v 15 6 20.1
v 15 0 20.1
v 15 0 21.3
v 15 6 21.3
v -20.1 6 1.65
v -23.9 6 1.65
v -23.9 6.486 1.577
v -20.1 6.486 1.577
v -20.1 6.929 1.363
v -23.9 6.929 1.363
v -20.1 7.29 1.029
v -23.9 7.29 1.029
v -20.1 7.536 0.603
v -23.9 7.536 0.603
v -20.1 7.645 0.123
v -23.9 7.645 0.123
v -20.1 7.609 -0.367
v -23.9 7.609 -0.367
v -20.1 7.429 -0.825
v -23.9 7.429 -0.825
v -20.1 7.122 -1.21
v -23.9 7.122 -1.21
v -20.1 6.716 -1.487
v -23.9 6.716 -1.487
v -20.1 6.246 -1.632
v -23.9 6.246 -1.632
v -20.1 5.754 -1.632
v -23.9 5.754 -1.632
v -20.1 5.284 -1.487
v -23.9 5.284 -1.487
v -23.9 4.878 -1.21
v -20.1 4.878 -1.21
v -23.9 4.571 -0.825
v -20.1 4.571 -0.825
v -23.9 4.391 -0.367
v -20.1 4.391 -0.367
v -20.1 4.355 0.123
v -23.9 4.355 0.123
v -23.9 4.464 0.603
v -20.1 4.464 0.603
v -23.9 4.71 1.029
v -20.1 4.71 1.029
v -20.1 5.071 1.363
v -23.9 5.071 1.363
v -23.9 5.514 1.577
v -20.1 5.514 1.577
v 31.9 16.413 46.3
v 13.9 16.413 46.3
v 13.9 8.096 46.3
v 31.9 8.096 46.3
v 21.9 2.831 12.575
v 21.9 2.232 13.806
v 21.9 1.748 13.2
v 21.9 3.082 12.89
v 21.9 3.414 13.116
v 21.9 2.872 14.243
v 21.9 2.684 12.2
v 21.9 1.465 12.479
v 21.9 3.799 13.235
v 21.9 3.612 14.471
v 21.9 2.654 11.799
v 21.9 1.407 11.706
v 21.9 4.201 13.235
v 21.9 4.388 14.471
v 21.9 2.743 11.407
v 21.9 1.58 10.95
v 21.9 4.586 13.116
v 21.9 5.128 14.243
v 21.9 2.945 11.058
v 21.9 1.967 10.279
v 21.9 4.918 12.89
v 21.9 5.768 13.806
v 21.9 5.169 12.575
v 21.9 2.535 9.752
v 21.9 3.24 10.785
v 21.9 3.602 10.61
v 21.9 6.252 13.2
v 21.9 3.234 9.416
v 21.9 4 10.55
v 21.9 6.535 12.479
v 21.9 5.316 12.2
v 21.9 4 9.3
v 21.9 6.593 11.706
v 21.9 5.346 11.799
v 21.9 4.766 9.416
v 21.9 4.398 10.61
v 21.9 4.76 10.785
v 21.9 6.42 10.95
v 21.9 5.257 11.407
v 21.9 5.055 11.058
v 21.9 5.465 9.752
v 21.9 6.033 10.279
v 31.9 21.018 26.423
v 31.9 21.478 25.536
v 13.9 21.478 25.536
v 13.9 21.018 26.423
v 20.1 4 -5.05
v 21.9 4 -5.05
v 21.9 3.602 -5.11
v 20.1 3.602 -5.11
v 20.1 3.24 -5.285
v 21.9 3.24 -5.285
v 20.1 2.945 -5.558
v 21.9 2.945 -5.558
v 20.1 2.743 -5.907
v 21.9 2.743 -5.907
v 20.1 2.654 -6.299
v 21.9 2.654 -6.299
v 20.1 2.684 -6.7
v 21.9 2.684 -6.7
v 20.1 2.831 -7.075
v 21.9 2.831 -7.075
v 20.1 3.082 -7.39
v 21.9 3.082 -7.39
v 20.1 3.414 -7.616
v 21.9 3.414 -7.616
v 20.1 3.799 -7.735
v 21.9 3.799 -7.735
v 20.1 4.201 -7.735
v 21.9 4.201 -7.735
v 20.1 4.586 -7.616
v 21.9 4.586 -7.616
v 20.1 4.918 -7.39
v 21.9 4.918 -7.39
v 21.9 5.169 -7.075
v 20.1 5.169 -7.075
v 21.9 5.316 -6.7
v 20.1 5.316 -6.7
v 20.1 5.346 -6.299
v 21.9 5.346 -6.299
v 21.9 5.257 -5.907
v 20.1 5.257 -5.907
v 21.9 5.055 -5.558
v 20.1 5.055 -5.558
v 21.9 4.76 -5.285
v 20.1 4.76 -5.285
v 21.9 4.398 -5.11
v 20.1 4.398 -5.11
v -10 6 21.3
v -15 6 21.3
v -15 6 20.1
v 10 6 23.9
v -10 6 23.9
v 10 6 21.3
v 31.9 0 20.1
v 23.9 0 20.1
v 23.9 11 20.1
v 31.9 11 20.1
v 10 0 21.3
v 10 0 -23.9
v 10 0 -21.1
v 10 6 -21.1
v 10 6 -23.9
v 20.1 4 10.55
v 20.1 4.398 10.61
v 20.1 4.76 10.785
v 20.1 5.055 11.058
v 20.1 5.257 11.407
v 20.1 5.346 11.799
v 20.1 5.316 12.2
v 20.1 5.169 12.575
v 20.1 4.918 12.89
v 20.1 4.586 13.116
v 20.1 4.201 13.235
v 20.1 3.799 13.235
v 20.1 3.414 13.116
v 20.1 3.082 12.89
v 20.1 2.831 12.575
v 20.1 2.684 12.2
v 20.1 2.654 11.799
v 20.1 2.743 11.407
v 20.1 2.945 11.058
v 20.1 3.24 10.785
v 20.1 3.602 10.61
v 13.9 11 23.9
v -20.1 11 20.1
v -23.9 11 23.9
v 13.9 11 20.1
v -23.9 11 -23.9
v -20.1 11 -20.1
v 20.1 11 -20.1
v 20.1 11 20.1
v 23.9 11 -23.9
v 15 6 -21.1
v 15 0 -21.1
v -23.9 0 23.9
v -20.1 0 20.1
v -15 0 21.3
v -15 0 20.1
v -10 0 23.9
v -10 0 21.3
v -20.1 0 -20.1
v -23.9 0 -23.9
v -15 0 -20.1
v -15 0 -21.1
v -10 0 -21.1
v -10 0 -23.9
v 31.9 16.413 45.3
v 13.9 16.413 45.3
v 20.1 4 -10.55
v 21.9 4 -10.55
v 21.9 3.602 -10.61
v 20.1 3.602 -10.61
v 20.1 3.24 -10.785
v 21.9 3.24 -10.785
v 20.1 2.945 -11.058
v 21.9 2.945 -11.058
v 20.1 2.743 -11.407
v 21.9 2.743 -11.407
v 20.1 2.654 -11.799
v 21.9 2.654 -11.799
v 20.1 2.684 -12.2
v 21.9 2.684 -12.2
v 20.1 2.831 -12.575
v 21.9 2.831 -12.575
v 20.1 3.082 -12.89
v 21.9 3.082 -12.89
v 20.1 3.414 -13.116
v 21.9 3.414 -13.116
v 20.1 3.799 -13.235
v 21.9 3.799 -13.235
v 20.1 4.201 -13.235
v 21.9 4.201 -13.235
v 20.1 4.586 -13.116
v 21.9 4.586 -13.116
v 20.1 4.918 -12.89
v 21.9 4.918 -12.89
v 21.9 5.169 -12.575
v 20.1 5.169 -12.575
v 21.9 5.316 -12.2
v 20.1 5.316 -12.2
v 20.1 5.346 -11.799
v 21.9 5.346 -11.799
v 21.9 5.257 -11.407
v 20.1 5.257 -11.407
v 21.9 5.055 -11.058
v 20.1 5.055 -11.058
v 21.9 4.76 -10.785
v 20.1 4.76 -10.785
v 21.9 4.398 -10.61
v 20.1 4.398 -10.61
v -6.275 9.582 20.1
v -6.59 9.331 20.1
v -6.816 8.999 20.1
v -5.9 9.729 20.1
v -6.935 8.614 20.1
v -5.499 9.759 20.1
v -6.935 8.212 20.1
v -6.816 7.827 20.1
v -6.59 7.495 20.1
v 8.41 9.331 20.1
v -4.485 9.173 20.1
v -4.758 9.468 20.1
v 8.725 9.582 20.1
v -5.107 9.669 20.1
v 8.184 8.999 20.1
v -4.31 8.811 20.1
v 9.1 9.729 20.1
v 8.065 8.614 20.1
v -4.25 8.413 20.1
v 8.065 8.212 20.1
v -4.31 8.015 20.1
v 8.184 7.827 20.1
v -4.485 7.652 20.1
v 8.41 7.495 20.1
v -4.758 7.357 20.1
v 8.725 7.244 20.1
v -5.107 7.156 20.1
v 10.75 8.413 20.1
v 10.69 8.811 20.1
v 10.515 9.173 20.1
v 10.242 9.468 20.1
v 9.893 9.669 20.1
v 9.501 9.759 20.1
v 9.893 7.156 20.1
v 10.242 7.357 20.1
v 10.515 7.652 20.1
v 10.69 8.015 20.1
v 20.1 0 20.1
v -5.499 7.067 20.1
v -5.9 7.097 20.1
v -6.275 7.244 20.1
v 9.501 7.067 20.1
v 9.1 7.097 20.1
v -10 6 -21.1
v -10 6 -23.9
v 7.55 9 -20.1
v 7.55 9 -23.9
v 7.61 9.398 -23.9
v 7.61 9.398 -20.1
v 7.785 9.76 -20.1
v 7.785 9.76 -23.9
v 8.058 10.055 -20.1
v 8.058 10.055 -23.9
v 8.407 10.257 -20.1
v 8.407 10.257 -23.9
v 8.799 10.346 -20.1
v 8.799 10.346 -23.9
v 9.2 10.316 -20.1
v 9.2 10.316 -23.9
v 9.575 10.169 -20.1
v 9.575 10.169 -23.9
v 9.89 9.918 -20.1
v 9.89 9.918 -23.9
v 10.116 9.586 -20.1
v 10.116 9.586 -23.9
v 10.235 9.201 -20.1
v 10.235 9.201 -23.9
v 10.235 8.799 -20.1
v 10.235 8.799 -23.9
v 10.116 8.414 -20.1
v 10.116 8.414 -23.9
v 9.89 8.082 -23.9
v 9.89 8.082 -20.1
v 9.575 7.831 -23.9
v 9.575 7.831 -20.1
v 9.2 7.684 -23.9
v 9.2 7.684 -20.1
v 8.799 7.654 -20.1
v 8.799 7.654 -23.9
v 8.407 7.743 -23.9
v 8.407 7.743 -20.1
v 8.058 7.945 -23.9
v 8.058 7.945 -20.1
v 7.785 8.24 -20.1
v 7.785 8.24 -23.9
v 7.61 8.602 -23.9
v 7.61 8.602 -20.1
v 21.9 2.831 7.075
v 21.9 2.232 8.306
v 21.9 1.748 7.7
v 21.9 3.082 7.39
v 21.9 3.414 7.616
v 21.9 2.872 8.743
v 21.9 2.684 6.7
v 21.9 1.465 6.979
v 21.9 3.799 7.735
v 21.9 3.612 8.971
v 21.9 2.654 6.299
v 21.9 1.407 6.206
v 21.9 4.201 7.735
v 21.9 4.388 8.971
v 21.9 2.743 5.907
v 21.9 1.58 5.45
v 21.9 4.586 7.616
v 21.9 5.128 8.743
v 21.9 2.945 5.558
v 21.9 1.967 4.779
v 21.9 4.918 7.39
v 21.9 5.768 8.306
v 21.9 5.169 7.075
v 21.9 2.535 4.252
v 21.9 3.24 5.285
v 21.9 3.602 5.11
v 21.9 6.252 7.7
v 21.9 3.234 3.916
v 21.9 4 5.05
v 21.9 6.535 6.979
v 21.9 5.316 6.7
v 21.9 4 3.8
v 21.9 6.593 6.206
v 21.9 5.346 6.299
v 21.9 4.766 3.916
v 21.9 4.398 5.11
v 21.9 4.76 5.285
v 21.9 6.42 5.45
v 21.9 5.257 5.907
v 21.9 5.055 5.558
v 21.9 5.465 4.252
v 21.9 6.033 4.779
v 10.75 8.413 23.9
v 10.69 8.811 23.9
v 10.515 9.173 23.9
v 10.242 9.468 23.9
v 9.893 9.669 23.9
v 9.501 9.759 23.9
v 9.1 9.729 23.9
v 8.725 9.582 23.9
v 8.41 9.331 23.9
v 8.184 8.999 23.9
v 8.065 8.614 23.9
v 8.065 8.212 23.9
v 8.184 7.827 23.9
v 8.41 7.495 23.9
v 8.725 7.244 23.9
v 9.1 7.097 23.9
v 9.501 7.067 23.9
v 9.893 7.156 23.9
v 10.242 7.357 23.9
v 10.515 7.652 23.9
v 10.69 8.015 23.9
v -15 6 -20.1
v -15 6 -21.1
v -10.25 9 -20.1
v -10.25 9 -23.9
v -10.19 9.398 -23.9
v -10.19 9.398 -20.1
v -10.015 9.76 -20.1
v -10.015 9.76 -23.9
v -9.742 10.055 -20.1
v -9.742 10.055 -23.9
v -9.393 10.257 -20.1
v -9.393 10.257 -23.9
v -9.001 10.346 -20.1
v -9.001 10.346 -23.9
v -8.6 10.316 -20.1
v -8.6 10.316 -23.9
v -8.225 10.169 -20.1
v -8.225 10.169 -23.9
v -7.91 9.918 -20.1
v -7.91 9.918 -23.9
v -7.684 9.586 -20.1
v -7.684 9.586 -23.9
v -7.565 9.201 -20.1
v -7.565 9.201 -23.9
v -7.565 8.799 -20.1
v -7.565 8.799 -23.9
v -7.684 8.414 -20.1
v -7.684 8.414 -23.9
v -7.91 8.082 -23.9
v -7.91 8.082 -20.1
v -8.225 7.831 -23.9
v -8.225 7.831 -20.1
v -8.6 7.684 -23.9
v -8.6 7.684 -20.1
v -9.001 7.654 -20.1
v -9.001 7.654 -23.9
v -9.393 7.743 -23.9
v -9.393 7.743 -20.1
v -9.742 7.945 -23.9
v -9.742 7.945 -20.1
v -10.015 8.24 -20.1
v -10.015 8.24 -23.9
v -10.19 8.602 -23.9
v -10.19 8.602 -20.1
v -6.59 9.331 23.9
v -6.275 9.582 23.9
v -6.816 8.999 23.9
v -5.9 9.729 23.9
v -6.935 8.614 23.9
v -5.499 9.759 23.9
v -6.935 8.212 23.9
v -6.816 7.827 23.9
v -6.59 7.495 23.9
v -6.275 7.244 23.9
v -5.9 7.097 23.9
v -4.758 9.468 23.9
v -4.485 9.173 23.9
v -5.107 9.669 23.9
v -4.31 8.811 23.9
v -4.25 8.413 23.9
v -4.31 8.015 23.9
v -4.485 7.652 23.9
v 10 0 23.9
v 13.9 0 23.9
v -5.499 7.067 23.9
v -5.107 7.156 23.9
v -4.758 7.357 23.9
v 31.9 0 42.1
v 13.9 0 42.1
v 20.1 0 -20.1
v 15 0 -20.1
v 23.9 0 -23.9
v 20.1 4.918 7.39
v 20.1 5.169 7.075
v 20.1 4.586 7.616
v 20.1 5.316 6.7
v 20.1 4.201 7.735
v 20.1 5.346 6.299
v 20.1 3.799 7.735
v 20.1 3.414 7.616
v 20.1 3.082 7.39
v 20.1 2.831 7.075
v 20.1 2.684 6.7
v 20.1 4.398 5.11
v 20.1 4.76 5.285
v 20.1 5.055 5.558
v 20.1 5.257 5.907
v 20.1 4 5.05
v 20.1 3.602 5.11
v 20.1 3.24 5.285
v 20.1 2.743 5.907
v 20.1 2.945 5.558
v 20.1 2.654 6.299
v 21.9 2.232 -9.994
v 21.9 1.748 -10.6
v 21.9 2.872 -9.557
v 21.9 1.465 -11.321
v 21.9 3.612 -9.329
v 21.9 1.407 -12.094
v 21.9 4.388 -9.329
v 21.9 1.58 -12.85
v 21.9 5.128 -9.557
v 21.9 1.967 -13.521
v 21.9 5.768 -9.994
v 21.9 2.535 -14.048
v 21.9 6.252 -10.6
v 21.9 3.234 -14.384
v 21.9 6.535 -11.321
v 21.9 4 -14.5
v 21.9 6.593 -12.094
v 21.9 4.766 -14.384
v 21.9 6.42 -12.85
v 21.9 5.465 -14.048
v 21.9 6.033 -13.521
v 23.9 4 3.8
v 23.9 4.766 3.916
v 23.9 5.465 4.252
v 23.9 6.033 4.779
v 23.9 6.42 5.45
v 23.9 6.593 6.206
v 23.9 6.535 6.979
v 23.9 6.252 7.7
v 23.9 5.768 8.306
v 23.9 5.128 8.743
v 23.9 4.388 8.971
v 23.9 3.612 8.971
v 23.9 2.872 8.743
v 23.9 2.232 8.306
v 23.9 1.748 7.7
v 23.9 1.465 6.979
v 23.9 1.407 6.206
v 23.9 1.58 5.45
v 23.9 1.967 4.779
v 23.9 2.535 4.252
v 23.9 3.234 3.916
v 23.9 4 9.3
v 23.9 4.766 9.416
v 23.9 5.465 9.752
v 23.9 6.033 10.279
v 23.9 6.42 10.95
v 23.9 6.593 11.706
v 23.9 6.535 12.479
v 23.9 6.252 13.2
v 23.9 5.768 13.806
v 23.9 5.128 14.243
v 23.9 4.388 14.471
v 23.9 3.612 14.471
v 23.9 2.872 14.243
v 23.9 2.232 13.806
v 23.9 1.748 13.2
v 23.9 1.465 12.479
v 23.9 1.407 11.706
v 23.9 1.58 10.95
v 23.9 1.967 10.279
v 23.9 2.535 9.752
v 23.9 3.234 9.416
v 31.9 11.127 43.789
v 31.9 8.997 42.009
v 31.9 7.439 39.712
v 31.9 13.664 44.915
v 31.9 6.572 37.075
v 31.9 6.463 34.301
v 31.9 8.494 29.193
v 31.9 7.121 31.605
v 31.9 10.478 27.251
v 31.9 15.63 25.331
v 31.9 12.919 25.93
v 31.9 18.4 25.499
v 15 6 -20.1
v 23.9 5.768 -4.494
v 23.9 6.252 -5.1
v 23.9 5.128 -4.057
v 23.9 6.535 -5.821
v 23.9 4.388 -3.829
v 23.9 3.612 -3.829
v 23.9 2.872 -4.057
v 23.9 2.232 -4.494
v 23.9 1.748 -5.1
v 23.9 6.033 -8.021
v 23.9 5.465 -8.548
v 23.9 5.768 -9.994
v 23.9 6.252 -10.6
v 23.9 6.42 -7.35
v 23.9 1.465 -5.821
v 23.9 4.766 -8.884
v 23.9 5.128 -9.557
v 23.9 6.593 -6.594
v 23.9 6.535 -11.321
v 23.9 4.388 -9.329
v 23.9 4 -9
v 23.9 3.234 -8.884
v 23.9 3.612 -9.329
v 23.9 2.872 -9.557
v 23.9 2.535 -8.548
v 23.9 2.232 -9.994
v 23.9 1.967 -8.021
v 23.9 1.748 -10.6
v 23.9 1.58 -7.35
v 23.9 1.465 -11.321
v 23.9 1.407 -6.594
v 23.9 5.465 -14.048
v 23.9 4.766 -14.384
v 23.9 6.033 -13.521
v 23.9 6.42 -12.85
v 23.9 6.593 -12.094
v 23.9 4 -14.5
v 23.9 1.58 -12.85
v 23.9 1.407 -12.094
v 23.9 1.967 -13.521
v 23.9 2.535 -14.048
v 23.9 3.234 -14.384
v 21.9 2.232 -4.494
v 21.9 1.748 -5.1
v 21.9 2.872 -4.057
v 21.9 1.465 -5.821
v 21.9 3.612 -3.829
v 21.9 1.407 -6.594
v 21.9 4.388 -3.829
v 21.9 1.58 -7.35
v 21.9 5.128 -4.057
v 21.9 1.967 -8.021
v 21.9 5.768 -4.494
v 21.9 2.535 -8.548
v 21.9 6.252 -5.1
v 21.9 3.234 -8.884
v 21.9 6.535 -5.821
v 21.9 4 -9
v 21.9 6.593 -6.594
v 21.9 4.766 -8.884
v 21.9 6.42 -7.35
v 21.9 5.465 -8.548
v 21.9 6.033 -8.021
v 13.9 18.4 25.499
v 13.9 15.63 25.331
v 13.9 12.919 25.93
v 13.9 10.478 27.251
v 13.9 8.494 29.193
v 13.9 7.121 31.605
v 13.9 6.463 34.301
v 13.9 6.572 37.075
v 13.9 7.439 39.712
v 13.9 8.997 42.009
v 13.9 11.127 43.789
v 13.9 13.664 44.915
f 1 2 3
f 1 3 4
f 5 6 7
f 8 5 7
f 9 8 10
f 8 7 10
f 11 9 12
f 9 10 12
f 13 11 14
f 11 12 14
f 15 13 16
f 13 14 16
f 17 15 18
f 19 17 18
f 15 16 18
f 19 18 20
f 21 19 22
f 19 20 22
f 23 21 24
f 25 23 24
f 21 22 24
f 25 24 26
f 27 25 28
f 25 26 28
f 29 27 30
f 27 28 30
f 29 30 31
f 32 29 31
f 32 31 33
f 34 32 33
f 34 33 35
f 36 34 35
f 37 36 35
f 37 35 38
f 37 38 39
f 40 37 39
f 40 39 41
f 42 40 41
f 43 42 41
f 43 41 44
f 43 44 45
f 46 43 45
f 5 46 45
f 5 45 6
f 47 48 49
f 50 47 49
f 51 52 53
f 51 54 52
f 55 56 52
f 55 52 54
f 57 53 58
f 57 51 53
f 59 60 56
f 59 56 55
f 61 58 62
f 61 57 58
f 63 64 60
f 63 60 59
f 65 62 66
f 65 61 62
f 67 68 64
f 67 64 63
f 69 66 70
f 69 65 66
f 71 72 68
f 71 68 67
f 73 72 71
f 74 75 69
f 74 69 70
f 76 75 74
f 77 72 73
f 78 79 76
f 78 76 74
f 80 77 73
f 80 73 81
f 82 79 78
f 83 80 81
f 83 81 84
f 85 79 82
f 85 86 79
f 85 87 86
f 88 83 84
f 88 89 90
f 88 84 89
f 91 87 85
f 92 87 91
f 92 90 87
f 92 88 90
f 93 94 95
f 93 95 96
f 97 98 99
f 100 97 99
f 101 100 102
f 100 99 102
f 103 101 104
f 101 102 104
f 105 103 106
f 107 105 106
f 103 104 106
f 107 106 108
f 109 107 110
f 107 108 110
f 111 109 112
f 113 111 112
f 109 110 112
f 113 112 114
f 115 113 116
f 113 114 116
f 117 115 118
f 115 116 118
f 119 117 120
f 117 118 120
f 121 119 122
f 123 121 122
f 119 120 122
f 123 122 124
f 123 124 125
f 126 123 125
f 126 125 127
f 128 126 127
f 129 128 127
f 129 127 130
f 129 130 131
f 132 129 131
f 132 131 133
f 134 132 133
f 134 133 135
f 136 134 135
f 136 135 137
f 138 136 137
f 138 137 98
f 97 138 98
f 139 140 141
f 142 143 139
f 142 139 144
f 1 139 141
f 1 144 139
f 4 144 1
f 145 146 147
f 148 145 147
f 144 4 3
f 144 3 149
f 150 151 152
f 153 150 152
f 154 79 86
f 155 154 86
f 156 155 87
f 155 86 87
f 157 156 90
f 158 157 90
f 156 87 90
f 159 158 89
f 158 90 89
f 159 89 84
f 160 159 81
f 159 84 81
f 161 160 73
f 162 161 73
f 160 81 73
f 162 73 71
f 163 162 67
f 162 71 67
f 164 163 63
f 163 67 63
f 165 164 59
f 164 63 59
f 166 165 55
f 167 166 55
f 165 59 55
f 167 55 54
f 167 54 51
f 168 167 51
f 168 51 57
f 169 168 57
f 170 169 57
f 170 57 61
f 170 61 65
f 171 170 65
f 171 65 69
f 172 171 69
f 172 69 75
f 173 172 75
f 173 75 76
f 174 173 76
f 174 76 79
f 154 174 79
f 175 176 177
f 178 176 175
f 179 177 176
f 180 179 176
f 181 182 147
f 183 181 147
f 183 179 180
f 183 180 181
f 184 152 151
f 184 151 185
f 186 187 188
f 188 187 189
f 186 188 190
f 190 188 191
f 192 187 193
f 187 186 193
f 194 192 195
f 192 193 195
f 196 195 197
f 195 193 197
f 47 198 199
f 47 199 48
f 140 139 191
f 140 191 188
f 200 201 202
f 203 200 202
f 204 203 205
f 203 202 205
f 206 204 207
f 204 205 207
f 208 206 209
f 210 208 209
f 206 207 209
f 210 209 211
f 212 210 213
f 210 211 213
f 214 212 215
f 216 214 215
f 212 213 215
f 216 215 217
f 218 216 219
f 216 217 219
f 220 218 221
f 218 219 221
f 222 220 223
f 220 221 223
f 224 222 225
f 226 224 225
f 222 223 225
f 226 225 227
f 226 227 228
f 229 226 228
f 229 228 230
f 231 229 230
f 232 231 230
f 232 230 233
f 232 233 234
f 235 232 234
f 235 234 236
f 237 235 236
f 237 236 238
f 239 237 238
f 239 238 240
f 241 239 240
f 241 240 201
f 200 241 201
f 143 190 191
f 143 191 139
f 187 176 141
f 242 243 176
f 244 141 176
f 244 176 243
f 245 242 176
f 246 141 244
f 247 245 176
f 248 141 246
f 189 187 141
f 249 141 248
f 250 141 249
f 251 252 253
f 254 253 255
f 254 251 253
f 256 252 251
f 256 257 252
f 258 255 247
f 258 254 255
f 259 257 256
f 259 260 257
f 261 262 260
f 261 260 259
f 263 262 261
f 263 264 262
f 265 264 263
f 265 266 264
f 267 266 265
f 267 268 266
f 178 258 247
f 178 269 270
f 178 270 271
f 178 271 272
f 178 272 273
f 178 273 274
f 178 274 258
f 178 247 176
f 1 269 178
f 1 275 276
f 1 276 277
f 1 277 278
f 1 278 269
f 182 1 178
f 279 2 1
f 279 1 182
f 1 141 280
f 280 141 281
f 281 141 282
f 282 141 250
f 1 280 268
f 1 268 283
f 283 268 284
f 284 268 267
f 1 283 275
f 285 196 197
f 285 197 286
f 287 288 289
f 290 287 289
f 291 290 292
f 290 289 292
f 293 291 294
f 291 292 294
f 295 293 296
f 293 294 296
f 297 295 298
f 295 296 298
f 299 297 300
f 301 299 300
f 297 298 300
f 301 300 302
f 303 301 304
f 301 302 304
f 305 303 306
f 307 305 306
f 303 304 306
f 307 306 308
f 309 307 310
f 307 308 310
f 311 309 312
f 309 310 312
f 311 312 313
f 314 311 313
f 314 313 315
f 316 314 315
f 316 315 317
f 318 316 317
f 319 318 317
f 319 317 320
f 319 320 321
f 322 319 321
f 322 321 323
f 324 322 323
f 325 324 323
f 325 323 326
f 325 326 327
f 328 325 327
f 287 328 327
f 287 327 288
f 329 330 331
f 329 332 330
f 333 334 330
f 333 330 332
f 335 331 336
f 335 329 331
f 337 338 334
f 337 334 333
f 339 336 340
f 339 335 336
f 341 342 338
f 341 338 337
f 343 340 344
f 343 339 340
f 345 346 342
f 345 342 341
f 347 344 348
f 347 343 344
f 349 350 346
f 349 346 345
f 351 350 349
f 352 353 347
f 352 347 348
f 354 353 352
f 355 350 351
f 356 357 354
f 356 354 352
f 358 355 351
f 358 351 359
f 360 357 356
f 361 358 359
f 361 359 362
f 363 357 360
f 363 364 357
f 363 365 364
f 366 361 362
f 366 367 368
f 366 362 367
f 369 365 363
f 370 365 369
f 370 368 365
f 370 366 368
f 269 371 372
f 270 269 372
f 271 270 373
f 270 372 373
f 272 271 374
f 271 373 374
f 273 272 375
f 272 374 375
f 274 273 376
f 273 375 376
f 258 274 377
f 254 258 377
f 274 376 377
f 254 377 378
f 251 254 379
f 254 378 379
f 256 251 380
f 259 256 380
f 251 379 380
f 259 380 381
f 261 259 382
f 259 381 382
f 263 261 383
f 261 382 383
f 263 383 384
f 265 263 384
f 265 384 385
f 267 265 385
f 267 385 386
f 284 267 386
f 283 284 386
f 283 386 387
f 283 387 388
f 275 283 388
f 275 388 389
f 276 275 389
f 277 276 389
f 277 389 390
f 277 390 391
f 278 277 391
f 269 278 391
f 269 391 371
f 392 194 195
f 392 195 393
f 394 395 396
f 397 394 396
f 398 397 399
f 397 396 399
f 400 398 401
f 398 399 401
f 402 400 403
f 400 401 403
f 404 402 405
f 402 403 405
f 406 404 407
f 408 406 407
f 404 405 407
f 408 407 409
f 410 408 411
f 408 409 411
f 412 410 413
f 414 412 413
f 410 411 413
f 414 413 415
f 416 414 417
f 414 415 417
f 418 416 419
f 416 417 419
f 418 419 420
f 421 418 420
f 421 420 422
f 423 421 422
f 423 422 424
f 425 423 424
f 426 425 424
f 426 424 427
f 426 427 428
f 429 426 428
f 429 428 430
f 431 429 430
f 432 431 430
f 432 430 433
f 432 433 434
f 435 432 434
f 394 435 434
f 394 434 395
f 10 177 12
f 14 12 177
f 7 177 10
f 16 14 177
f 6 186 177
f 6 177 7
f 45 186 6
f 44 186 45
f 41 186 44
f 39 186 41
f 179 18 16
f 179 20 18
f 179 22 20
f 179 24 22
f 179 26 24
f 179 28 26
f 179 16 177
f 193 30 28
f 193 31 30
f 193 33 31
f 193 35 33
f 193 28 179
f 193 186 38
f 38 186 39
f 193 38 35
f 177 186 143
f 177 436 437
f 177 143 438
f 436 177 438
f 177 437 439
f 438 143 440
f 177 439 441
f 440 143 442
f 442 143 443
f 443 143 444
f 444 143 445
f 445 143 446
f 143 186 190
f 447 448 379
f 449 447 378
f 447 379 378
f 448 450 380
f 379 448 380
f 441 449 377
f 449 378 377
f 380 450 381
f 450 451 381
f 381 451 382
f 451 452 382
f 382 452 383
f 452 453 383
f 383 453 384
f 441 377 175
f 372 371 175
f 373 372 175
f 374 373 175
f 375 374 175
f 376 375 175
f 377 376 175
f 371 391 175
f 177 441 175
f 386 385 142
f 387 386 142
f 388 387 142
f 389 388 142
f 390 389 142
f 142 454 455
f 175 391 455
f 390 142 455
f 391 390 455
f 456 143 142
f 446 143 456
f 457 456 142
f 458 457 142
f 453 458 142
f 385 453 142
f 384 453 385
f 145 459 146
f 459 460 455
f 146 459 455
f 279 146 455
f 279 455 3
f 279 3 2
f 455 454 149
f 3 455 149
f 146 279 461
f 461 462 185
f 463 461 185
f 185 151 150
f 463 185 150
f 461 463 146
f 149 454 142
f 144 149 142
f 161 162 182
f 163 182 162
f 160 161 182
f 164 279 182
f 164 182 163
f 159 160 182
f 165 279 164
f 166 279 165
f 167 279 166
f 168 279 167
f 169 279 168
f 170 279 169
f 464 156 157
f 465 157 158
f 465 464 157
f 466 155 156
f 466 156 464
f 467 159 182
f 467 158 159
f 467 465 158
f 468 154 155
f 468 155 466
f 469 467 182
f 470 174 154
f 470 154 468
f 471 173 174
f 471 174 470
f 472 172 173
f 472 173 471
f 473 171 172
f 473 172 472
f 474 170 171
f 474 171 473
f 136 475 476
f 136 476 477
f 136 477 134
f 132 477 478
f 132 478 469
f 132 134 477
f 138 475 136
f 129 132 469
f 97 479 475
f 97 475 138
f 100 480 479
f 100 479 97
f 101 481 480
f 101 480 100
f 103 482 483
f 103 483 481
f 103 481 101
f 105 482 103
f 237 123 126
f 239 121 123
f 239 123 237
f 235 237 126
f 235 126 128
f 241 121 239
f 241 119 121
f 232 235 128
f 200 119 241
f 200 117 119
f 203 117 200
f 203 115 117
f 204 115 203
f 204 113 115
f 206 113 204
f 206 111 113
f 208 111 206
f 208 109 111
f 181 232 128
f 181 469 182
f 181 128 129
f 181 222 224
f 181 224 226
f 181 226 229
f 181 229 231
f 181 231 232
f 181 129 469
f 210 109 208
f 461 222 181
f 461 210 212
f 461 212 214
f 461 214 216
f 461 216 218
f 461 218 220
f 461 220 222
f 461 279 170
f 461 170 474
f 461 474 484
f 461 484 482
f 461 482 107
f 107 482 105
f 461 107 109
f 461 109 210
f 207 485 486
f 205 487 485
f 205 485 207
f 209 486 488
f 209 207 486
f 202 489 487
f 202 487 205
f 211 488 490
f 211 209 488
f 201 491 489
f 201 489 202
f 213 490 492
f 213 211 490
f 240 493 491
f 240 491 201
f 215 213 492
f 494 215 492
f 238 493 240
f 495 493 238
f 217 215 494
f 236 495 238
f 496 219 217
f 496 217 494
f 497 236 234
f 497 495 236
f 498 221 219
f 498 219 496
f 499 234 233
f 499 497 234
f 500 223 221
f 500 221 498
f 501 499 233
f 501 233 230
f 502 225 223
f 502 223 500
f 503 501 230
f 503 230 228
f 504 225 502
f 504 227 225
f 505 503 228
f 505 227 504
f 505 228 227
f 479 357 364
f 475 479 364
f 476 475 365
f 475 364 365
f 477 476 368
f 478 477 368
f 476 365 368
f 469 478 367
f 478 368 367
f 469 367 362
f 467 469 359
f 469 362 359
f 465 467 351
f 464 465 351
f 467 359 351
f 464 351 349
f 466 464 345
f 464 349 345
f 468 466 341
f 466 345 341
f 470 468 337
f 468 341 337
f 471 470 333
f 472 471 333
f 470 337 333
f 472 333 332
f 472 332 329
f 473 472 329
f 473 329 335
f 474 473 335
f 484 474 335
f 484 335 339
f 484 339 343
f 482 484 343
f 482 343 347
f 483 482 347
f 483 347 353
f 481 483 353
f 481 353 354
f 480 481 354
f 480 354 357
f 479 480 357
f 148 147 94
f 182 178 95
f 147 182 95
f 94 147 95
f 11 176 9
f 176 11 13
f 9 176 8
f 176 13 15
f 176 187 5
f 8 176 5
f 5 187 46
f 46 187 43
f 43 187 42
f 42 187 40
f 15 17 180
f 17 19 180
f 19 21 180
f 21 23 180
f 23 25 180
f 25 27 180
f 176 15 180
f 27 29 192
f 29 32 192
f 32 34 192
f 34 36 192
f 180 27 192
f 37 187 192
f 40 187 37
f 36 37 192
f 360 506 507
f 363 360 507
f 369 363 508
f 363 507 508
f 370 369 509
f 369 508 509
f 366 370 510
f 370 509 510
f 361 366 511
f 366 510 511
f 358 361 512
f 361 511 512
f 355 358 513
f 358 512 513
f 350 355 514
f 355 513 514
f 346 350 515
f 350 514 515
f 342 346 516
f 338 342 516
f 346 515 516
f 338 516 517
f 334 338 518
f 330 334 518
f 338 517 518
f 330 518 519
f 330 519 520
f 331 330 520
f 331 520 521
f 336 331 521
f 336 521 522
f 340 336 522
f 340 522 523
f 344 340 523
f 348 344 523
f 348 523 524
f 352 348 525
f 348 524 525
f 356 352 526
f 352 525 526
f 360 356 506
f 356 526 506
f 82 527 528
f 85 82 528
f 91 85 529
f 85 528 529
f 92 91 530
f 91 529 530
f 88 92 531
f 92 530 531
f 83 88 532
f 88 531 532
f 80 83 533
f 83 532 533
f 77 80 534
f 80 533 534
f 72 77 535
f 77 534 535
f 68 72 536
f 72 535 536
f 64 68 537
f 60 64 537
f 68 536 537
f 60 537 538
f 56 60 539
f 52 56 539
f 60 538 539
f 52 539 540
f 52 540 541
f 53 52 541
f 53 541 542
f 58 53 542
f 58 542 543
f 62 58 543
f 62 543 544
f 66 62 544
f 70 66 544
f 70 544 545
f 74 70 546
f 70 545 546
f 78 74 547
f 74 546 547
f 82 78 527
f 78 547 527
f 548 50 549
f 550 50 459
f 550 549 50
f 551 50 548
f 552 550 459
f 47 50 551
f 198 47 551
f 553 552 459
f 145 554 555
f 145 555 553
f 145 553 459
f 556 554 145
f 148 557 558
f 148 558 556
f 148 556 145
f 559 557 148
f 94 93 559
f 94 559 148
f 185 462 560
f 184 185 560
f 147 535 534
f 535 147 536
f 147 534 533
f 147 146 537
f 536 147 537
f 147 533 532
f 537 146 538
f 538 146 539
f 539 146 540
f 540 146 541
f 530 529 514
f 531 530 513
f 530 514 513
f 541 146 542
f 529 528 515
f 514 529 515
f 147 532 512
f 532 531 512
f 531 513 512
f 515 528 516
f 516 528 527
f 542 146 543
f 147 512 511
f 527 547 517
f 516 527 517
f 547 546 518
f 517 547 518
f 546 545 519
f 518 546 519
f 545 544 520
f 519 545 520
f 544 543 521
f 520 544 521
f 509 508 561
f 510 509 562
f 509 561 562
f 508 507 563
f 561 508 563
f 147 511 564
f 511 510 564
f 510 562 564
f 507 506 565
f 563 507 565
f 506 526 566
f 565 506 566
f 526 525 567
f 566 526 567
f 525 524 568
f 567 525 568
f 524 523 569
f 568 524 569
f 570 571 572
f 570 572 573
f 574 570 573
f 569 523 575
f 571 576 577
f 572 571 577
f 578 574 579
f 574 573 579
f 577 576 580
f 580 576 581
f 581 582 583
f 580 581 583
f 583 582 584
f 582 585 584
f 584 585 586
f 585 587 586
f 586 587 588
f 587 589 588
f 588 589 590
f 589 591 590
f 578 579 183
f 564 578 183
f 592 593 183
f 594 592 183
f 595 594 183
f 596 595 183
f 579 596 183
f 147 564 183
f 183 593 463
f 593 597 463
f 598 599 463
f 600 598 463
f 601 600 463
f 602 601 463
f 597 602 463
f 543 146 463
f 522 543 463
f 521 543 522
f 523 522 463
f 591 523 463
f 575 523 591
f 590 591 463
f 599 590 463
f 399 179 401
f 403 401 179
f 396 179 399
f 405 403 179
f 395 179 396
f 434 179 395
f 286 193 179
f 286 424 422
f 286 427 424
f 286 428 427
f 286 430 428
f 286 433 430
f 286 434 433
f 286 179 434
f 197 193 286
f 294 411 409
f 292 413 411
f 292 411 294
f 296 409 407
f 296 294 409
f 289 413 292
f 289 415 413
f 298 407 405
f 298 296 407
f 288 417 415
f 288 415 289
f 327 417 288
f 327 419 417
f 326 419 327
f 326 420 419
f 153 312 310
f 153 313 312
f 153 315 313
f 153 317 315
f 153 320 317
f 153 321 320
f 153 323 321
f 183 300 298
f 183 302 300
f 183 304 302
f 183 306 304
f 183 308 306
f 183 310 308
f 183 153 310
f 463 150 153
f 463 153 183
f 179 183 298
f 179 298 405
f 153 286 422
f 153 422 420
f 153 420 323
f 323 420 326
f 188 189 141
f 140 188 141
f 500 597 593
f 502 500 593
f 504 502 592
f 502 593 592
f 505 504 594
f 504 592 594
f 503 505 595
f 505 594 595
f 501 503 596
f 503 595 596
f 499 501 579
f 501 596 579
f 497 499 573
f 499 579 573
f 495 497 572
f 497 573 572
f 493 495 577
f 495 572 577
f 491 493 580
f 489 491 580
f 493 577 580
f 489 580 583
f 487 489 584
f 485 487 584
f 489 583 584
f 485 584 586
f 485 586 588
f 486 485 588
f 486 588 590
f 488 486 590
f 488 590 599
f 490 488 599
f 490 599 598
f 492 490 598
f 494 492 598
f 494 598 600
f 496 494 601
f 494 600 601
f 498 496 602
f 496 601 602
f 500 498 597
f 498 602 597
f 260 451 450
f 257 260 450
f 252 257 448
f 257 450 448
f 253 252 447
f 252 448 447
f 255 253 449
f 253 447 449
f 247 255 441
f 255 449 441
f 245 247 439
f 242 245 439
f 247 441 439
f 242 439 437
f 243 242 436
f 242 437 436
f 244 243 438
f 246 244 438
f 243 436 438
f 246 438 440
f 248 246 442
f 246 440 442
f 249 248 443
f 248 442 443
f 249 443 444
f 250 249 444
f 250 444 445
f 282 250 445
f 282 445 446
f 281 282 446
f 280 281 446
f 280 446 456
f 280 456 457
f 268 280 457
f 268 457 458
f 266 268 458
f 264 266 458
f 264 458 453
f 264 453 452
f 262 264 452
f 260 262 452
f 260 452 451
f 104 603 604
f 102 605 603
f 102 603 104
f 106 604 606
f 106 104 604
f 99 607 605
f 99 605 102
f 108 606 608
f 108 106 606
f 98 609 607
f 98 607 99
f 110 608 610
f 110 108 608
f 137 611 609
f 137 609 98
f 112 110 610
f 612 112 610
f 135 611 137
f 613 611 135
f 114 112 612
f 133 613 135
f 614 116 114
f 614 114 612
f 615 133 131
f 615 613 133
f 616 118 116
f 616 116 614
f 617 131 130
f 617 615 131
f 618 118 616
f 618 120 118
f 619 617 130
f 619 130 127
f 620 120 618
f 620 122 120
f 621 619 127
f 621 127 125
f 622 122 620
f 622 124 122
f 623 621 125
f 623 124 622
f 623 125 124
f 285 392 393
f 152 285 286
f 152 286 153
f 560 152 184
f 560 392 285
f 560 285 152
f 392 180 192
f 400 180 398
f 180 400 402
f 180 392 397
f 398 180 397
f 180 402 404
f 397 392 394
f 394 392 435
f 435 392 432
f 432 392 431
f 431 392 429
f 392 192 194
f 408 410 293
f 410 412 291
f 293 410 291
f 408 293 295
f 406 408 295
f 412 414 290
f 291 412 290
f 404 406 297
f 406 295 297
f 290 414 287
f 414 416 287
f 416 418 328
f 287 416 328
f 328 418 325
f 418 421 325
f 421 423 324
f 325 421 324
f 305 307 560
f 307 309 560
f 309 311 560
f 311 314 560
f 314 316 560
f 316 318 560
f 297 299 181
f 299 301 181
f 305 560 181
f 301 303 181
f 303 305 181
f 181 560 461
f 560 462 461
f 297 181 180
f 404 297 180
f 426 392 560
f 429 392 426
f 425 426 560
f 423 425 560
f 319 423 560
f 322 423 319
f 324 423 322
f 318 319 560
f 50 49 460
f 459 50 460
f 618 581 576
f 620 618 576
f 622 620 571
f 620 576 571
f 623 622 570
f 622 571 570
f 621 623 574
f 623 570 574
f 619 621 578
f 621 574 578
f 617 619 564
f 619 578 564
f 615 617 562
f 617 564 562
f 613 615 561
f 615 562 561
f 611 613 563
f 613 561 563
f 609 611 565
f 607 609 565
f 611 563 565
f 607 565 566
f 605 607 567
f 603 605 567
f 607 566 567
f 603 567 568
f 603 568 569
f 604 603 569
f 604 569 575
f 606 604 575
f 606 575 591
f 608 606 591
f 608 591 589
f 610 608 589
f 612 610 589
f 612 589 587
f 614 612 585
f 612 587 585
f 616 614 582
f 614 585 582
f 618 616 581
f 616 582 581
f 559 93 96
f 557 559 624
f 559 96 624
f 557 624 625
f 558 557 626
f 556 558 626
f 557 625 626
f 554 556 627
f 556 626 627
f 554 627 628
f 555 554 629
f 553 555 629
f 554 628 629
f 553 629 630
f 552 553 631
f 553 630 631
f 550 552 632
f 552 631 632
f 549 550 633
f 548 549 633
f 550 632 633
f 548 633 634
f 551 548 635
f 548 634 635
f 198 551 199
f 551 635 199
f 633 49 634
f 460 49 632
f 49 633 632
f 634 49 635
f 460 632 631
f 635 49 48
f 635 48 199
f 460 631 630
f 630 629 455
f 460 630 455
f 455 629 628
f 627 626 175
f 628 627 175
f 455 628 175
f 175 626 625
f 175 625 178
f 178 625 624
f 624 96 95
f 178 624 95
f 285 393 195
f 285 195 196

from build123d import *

# Parameters (mm, degrees)
SKETCH1_W                = 47.8
SKETCH1_H                = 47.8
SKETCH1_W_2              = 40.2
SKETCH1_H_2              = 40.2
BOSS_EXTRUDE1_DEPTH      = 11
SKETCH3_W                = 20
SKETCH3_H                = 6
CUT_EXTRUDE1_DEPTH       = 55.562349656
SKETCH4_W                = 5
SKETCH4_H                = 6
CUT_EXTRUDE2_DEPTH       = 1
CUT_EXTRUDE4_REACH       = 56.562
SKETCH6_R                = 1.35
CUT_EXTRUDE5_REACH       = 56.562
SKETCH7_R                = 1.35
CUT_EXTRUDE6_REACH       = 56.562
SKETCH8_R                = 1.35
CUT_EXTRUDE7_REACH       = 56.562
SKETCH9_R                = 1.65
BOSS_EXTRUDE7_DEPTH      = 8
BOSS_EXTRUDE7_DEPTH_BACK = 10
SKETCH5_W                = 5
SKETCH5_H                = 6
CUT_EXTRUDE3_DEPTH       = 1.2
SKETCH11_R               = 2.6
CUT_EXTRUDE8_DEPTH       = 2


with BuildPart() as part:
    # Sketch1 → Boss-Extrude1 (new body)
    with BuildSketch(Plane(origin=(0, 0, 0), x_dir=(1, 0, 0), z_dir=(0, 1, 0))):
        Rectangle(SKETCH1_W, SKETCH1_H)
        Rectangle(SKETCH1_W_2, SKETCH1_H_2, mode=Mode.SUBTRACT)
    extrude(amount=BOSS_EXTRUDE1_DEPTH)

    # Sketch3 → Cut-Extrude1 (cut, through all)
    with BuildSketch(Plane.XY.offset(23.9)):
        with Locations((0, 3)):
            Rectangle(SKETCH3_W, SKETCH3_H)
    extrude(amount=-CUT_EXTRUDE1_DEPTH, mode=Mode.SUBTRACT)

    # Sketch4 → Cut-Extrude2 (cut)
    with BuildSketch(Plane.XY.offset(-20.1)):
        with Locations((-12.5, 3)):
            Rectangle(SKETCH4_W, SKETCH4_H)
        with Locations((12.5, 3)):
            Rectangle(SKETCH4_W, SKETCH4_H)
    extrude(amount=-CUT_EXTRUDE2_DEPTH, mode=Mode.SUBTRACT)

    # Sketch6 → Cut-Extrude4 (cut, up to next)
    with BuildSketch(Plane(origin=(0, 0, -23.9), x_dir=(-1, 0, 0), z_dir=(0, 0, -1)), mode=Mode.PRIVATE) as cut_extrude4_sk1:
        with Locations((-8.9, 9)):
            Circle(SKETCH6_R)
    cut_extrude4_tool1 = extrude(cut_extrude4_sk1.sketch, amount=-CUT_EXTRUDE4_REACH, mode=Mode.PRIVATE) & part.part
    # Sketch6 → Cut-Extrude4 (cut, up to next)
    with BuildSketch(Plane(origin=(0, 0, -23.9), x_dir=(-1, 0, 0), z_dir=(0, 0, -1)), mode=Mode.PRIVATE) as cut_extrude4_sk2:
        with Locations((8.9, 9)):
            Circle(SKETCH6_R)
    cut_extrude4_tool2 = extrude(cut_extrude4_sk2.sketch, amount=-CUT_EXTRUDE4_REACH, mode=Mode.PRIVATE) & part.part
    add(cut_extrude4_tool1.solids().sort_by_distance((8.9, 9, -23.9))[0], mode=Mode.SUBTRACT)
    add(cut_extrude4_tool2.solids().sort_by_distance((-8.9, 9, -23.9))[0], mode=Mode.SUBTRACT)

    # Sketch7 → Cut-Extrude5 (cut, up to next)
    with BuildSketch(Plane.XY.offset(23.9), mode=Mode.PRIVATE) as cut_extrude5_sk1:
        with Locations((9.4, 8.412816521)):
            Circle(SKETCH7_R)
    cut_extrude5_tool1 = extrude(cut_extrude5_sk1.sketch, amount=-CUT_EXTRUDE5_REACH, mode=Mode.PRIVATE) & part.part
    # Sketch7 → Cut-Extrude5 (cut, up to next)
    with BuildSketch(Plane.XY.offset(23.9), mode=Mode.PRIVATE) as cut_extrude5_sk2:
        with Locations((-5.6, 8.412816521)):
            Circle(SKETCH7_R)
    cut_extrude5_tool2 = extrude(cut_extrude5_sk2.sketch, amount=-CUT_EXTRUDE5_REACH, mode=Mode.PRIVATE) & part.part
    add(cut_extrude5_tool1.solids().sort_by_distance((9.4, 8.412817, 23.9))[0], mode=Mode.SUBTRACT)
    add(cut_extrude5_tool2.solids().sort_by_distance((-5.6, 8.412817, 23.9))[0], mode=Mode.SUBTRACT)

    # Sketch8 → Cut-Extrude6 (cut, up to next)
    with BuildSketch(Plane(origin=(23.9, 0, 0), x_dir=(0, 0, -1), z_dir=(1, 0, 0)), mode=Mode.PRIVATE) as cut_extrude6_sk1:
        with Locations((-11.9, 4)):
            Circle(SKETCH8_R)
    cut_extrude6_tool1 = extrude(cut_extrude6_sk1.sketch, amount=-CUT_EXTRUDE6_REACH, mode=Mode.PRIVATE) & part.part
    # Sketch8 → Cut-Extrude6 (cut, up to next)
    with BuildSketch(Plane(origin=(23.9, 0, 0), x_dir=(0, 0, -1), z_dir=(1, 0, 0)), mode=Mode.PRIVATE) as cut_extrude6_sk2:
        with Locations((-6.4, 4)):
            Circle(SKETCH8_R)
    cut_extrude6_tool2 = extrude(cut_extrude6_sk2.sketch, amount=-CUT_EXTRUDE6_REACH, mode=Mode.PRIVATE) & part.part
    # Sketch8 → Cut-Extrude6 (cut, up to next)
    with BuildSketch(Plane(origin=(23.9, 0, 0), x_dir=(0, 0, -1), z_dir=(1, 0, 0)), mode=Mode.PRIVATE) as cut_extrude6_sk3:
        with Locations(Location((6.4, 4, 0), (0, 0, 180))):
            Circle(SKETCH8_R)
    cut_extrude6_tool3 = extrude(cut_extrude6_sk3.sketch, amount=-CUT_EXTRUDE6_REACH, mode=Mode.PRIVATE) & part.part
    # Sketch8 → Cut-Extrude6 (cut, up to next)
    with BuildSketch(Plane(origin=(23.9, 0, 0), x_dir=(0, 0, -1), z_dir=(1, 0, 0)), mode=Mode.PRIVATE) as cut_extrude6_sk4:
        with Locations(Location((11.9, 4, 0), (0, 0, 180))):
            Circle(SKETCH8_R)
    cut_extrude6_tool4 = extrude(cut_extrude6_sk4.sketch, amount=-CUT_EXTRUDE6_REACH, mode=Mode.PRIVATE) & part.part
    add(cut_extrude6_tool1.solids().sort_by_distance((23.9, 4, 11.9))[0], mode=Mode.SUBTRACT)
    add(cut_extrude6_tool2.solids().sort_by_distance((23.9, 4, 6.4))[0], mode=Mode.SUBTRACT)
    add(cut_extrude6_tool3.solids().sort_by_distance((23.9, 4, -6.4))[0], mode=Mode.SUBTRACT)
    add(cut_extrude6_tool4.solids().sort_by_distance((23.9, 4, -11.9))[0], mode=Mode.SUBTRACT)

    # Sketch9 → Cut-Extrude7 (cut, up to next)
    with BuildSketch(Plane.ZY.offset(23.9), mode=Mode.PRIVATE) as cut_extrude7_sk1:
        with Locations((0, 6)):
            Circle(SKETCH9_R)
    cut_extrude7_tool1 = extrude(cut_extrude7_sk1.sketch, amount=-CUT_EXTRUDE7_REACH, mode=Mode.PRIVATE) & part.part
    add(cut_extrude7_tool1.solids().sort_by_distance((-23.9, 6, 0))[0], mode=Mode.SUBTRACT)

    # Sketch10 → Boss-Extrude7 (add, two sides: drawn at the far end of the back side and taken through both)
    with BuildSketch(Plane(origin=(23.9, 0, 0), x_dir=(0, 0, -1), z_dir=(1, 0, 0)).offset(-BOSS_EXTRUDE7_DEPTH_BACK)):
        with BuildLine():
            Line((-42.1, 0), (-20.1, 0))
            Line((-20.1, 0), (-20.1, 11))
            Line((-20.1, 11), (-25.535668372, 21.478172171))
            ThreePointArc((-25.535668372, 21.478172171), (-32.693052351, 5.7261976), (-46.3, 16.412816521))
            Line((-46.3, 16.412816521), (-46.3, 8.096211929))
            Line((-46.3, 8.096211929), (-42.1, 0))
        make_face()
        with BuildLine():
            ThreePointArc((-46.3, 16.412816521), (-32.693052351, 5.7261976), (-25.535668372, 21.478172171))
            Line((-25.535668372, 21.478172171), (-26.423334884, 21.017685293))
            ThreePointArc((-26.423334884, 21.017685293), (-32.930047592, 6.697708411), (-45.3, 16.412816521))
            Line((-45.3, 16.412816521), (-46.3, 16.412816521))
        make_face()
    extrude(amount=BOSS_EXTRUDE7_DEPTH + BOSS_EXTRUDE7_DEPTH_BACK)

    # Sketch5 → Cut-Extrude3 (cut)
    with BuildSketch(Plane(origin=(0, 0, 20.1), x_dir=(-1, 0, 0), z_dir=(0, 0, -1))):
        with Locations((-12.5, 3)):
            Rectangle(SKETCH5_W, SKETCH5_H)
        with Locations((12.5, 3)):
            Rectangle(SKETCH5_W, SKETCH5_H)
    extrude(amount=-CUT_EXTRUDE3_DEPTH, mode=Mode.SUBTRACT)

    # Sketch11 → Cut-Extrude8 (cut)
    with BuildSketch(Plane(origin=(23.9, 0, 0), x_dir=(0, 0, -1), z_dir=(1, 0, 0))):
        with Locations((11.9, 4)):
            Circle(SKETCH11_R)
        with Locations((6.4, 4)):
            Circle(SKETCH11_R)
        with Locations((-6.4, 4)):
            Circle(SKETCH11_R)
        with Locations((-11.9, 4)):
            Circle(SKETCH11_R)
    extrude(amount=-CUT_EXTRUDE8_DEPTH, mode=Mode.SUBTRACT)


solid = part.part
